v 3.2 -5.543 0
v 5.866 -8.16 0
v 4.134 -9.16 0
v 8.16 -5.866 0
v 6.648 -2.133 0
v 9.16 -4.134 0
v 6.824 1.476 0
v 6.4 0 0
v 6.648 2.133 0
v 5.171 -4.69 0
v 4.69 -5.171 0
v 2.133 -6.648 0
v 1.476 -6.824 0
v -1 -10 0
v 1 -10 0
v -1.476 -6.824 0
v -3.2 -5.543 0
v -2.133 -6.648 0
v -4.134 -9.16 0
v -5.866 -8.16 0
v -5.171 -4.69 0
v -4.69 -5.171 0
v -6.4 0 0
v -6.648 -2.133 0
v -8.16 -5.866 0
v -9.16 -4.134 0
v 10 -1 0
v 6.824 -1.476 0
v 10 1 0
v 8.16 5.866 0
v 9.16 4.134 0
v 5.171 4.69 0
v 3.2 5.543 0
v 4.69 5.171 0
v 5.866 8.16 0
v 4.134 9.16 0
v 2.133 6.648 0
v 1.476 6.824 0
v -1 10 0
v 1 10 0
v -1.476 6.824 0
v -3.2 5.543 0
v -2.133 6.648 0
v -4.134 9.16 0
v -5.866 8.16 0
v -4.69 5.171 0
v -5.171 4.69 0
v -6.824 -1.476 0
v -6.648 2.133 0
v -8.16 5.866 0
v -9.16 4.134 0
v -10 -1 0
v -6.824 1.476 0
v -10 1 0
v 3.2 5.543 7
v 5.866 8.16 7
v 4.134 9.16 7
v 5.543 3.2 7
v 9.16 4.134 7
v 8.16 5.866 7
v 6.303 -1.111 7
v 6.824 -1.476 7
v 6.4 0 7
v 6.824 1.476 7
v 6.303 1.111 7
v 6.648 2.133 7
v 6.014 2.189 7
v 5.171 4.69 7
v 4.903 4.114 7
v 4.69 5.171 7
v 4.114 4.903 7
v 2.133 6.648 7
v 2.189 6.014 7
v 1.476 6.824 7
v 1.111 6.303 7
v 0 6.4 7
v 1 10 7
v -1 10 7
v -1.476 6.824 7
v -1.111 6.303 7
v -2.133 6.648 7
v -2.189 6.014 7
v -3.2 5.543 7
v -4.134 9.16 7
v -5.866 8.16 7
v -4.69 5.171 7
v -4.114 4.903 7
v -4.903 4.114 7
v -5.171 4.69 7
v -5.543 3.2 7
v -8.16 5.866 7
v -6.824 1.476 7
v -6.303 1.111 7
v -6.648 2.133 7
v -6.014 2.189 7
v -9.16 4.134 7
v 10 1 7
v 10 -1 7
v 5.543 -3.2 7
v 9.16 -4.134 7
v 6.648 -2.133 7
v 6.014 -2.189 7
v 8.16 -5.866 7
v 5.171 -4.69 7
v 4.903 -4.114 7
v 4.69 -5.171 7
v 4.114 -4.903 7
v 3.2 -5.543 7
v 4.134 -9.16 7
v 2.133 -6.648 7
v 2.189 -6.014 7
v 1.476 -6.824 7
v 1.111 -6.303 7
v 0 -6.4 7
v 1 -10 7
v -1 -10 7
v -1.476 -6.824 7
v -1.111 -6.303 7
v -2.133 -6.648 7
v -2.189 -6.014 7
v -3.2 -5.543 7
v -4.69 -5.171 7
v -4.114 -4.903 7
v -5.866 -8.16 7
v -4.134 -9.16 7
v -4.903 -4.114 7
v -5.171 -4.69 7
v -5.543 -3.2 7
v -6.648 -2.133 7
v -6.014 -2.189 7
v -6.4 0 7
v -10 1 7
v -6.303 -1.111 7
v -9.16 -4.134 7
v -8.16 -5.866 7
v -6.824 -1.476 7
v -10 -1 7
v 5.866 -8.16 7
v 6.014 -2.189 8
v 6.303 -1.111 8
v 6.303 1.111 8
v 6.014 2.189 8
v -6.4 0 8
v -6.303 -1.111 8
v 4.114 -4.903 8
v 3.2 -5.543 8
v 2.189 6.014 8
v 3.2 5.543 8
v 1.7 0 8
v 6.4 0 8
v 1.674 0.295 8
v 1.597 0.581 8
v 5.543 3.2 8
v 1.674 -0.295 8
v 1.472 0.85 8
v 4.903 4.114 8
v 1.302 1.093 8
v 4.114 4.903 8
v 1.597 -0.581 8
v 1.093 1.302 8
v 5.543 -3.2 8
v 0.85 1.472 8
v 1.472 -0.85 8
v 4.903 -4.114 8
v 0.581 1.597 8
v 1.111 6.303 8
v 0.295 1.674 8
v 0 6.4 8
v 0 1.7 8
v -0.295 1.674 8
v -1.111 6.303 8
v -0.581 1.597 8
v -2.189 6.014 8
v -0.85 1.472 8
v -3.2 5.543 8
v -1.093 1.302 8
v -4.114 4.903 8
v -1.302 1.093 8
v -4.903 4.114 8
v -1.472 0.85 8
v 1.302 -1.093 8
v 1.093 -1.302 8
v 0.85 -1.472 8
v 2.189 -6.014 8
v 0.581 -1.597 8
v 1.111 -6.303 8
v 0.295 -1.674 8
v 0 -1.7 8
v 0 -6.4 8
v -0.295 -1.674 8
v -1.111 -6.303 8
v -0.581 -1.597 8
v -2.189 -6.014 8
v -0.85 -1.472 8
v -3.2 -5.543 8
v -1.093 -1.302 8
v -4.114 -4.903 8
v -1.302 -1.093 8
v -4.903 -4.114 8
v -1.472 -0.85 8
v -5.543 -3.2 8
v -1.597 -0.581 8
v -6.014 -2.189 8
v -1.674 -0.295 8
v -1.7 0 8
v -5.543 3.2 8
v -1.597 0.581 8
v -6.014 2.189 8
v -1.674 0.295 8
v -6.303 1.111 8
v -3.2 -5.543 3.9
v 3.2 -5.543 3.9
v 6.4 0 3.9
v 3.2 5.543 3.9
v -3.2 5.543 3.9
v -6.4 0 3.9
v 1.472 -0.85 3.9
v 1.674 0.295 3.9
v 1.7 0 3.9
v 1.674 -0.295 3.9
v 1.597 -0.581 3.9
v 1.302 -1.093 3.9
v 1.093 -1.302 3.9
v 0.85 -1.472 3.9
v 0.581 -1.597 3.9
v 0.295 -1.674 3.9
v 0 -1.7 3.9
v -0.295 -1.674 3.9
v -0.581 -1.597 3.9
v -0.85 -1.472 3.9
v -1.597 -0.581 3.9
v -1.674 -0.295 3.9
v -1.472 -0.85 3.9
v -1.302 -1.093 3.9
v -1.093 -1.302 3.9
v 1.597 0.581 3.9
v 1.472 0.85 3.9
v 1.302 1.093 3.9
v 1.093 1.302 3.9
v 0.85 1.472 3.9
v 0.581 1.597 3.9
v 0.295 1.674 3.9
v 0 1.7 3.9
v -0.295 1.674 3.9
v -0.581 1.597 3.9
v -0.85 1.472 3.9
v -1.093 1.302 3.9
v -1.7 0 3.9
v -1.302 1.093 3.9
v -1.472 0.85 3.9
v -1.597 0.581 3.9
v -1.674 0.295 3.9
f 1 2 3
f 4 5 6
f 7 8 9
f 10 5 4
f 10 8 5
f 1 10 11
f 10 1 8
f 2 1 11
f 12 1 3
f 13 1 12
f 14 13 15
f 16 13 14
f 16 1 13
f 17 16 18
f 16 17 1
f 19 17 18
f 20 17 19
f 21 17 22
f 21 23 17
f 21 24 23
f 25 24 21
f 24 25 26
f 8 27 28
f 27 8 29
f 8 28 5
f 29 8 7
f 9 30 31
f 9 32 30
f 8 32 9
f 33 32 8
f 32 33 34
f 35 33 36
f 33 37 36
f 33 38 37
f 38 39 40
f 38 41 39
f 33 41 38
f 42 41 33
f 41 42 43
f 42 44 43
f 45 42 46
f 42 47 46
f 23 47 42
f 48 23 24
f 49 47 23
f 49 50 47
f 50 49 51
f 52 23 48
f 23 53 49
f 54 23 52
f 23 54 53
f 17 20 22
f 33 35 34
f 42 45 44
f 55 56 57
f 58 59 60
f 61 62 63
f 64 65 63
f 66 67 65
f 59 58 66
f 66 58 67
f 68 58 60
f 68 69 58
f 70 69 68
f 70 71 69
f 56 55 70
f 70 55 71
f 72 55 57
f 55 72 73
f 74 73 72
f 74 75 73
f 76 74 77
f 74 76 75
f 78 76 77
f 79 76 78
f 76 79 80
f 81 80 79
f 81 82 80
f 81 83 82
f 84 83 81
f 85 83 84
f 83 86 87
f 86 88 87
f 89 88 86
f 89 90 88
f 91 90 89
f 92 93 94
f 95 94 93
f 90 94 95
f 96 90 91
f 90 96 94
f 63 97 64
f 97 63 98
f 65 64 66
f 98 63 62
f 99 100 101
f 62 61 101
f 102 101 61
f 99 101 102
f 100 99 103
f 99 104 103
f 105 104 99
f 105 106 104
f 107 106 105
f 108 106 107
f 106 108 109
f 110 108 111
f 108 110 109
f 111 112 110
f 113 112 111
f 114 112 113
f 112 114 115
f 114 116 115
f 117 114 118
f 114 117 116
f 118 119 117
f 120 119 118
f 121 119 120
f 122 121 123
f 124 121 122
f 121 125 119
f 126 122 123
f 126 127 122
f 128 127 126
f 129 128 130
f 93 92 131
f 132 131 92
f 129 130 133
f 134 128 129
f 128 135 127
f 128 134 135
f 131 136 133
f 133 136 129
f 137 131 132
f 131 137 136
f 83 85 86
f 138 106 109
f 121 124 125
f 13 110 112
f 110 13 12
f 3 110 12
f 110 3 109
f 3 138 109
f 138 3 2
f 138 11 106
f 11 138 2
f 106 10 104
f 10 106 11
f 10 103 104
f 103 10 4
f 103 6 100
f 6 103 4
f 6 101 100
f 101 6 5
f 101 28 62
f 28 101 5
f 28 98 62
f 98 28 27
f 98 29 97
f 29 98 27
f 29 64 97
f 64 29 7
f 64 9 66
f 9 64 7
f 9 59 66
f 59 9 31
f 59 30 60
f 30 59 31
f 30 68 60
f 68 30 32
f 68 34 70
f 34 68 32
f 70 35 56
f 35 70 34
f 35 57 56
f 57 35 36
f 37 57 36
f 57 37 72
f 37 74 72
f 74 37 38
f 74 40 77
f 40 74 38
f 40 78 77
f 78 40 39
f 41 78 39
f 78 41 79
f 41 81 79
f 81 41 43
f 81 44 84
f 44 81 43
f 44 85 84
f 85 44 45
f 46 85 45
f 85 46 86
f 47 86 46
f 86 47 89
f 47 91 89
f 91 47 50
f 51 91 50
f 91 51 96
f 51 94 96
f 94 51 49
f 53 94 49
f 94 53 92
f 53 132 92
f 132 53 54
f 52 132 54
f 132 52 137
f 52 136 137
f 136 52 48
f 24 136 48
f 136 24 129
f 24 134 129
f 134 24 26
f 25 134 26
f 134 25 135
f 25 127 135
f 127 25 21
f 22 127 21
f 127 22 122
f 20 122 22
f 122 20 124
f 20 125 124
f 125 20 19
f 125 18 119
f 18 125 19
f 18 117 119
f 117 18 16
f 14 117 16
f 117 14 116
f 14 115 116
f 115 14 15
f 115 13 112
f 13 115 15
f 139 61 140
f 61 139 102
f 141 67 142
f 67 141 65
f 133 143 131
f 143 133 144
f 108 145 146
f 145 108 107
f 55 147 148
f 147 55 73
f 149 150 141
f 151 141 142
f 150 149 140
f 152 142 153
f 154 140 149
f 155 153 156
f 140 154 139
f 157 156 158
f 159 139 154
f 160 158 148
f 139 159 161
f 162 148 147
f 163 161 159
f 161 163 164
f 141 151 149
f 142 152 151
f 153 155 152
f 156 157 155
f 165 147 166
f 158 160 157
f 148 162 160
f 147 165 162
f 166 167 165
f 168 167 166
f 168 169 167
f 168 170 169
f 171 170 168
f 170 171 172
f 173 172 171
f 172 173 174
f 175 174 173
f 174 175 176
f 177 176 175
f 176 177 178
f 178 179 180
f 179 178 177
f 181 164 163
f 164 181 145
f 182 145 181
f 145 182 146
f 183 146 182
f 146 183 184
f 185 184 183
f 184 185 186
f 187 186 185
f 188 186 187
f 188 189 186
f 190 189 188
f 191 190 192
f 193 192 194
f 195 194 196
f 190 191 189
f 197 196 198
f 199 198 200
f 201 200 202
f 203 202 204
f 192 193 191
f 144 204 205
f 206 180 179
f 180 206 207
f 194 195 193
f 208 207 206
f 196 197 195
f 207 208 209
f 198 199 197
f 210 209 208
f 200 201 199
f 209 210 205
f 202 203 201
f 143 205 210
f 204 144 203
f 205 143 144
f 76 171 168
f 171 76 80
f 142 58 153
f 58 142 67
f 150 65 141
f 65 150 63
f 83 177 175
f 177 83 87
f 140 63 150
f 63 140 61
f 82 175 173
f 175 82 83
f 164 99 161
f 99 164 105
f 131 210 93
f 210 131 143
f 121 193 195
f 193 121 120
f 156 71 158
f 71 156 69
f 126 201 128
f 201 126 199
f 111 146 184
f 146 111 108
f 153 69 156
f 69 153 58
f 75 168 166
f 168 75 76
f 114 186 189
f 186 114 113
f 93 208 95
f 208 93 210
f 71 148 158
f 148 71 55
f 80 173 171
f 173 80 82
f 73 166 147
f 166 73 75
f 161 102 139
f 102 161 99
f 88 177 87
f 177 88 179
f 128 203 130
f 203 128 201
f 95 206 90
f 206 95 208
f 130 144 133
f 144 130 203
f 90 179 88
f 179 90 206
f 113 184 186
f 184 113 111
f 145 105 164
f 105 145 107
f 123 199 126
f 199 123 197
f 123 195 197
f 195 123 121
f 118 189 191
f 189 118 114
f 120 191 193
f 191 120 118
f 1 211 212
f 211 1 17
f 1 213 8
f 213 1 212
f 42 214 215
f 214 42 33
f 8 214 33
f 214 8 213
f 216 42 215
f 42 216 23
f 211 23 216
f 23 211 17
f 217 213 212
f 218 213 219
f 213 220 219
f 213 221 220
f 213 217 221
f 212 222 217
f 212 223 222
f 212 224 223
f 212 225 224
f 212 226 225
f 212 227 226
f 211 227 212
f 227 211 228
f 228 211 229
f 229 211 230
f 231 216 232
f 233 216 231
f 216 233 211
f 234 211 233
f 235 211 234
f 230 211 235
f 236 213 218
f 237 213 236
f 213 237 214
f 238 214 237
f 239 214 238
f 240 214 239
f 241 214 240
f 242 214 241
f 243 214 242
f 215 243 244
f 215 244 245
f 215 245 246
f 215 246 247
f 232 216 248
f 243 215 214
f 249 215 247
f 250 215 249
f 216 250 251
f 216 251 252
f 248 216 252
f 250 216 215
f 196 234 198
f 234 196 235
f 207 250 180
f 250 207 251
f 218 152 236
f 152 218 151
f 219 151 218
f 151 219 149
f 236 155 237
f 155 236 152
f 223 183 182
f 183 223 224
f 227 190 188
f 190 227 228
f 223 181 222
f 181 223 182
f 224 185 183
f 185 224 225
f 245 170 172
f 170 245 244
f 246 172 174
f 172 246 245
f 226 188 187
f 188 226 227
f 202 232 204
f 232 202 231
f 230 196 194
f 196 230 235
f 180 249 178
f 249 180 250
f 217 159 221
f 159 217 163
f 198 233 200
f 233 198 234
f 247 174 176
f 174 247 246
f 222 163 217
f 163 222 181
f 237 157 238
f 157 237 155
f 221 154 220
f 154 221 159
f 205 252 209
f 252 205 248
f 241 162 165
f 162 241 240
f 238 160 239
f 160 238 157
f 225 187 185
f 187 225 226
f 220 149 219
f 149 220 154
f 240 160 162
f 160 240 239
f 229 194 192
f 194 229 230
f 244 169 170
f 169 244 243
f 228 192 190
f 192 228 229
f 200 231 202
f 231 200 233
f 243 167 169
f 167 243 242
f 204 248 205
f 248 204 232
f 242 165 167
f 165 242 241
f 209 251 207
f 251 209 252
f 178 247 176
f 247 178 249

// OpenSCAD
Knob_thickness=7; //[1:1:30]
Knob_radius=7; //[1:1:30]
Center_hole_radius=1.7; //[0.1:0.1:15]
Nut_cave_radius=6.4;     // [0.1:0.1:15]
Nut_cave_height=4;     // [1:0.5:30]
Spikes_number=12; //[0:1:200]
Spike_width_internal=5; //[0.1:0.5:30]
Spike_width_external=2; //[0.1:0.5:30]
Spike_length=10; //[1:1:50]
Spikes_twist=0; //[0:1:30]



difference()
    {
    union()
        {
        translate([0,0,0])
         rotate([0,0,0])
          linear_extrude(Knob_thickness)
            {
            circle(Knob_radius,$fn=36);
            for(k=[0:1:Spikes_number])
                {
                rotate([0,0,360/Spikes_number*k])
                polygon(points=[[Spikes_twist/2,Spike_width_internal/2],[Spike_length,Spike_width_external/2+Spikes_twist],[Spike_length,-Spike_width_external/2+Spikes_twist],[Spikes_twist/2,-Spike_width_internal/2]]);
                }
            }
        translate([0,0,Knob_thickness])
        cylinder(r=Nut_cave_radius,h=1,$fn=36);
        }
    translate([0,0,-0.1])
    cylinder(r=Nut_cave_radius,h=Nut_cave_height,$fn=6);
    cylinder(r=Center_hole_radius,h=Knob_thickness*2,$fn=36);
    }
